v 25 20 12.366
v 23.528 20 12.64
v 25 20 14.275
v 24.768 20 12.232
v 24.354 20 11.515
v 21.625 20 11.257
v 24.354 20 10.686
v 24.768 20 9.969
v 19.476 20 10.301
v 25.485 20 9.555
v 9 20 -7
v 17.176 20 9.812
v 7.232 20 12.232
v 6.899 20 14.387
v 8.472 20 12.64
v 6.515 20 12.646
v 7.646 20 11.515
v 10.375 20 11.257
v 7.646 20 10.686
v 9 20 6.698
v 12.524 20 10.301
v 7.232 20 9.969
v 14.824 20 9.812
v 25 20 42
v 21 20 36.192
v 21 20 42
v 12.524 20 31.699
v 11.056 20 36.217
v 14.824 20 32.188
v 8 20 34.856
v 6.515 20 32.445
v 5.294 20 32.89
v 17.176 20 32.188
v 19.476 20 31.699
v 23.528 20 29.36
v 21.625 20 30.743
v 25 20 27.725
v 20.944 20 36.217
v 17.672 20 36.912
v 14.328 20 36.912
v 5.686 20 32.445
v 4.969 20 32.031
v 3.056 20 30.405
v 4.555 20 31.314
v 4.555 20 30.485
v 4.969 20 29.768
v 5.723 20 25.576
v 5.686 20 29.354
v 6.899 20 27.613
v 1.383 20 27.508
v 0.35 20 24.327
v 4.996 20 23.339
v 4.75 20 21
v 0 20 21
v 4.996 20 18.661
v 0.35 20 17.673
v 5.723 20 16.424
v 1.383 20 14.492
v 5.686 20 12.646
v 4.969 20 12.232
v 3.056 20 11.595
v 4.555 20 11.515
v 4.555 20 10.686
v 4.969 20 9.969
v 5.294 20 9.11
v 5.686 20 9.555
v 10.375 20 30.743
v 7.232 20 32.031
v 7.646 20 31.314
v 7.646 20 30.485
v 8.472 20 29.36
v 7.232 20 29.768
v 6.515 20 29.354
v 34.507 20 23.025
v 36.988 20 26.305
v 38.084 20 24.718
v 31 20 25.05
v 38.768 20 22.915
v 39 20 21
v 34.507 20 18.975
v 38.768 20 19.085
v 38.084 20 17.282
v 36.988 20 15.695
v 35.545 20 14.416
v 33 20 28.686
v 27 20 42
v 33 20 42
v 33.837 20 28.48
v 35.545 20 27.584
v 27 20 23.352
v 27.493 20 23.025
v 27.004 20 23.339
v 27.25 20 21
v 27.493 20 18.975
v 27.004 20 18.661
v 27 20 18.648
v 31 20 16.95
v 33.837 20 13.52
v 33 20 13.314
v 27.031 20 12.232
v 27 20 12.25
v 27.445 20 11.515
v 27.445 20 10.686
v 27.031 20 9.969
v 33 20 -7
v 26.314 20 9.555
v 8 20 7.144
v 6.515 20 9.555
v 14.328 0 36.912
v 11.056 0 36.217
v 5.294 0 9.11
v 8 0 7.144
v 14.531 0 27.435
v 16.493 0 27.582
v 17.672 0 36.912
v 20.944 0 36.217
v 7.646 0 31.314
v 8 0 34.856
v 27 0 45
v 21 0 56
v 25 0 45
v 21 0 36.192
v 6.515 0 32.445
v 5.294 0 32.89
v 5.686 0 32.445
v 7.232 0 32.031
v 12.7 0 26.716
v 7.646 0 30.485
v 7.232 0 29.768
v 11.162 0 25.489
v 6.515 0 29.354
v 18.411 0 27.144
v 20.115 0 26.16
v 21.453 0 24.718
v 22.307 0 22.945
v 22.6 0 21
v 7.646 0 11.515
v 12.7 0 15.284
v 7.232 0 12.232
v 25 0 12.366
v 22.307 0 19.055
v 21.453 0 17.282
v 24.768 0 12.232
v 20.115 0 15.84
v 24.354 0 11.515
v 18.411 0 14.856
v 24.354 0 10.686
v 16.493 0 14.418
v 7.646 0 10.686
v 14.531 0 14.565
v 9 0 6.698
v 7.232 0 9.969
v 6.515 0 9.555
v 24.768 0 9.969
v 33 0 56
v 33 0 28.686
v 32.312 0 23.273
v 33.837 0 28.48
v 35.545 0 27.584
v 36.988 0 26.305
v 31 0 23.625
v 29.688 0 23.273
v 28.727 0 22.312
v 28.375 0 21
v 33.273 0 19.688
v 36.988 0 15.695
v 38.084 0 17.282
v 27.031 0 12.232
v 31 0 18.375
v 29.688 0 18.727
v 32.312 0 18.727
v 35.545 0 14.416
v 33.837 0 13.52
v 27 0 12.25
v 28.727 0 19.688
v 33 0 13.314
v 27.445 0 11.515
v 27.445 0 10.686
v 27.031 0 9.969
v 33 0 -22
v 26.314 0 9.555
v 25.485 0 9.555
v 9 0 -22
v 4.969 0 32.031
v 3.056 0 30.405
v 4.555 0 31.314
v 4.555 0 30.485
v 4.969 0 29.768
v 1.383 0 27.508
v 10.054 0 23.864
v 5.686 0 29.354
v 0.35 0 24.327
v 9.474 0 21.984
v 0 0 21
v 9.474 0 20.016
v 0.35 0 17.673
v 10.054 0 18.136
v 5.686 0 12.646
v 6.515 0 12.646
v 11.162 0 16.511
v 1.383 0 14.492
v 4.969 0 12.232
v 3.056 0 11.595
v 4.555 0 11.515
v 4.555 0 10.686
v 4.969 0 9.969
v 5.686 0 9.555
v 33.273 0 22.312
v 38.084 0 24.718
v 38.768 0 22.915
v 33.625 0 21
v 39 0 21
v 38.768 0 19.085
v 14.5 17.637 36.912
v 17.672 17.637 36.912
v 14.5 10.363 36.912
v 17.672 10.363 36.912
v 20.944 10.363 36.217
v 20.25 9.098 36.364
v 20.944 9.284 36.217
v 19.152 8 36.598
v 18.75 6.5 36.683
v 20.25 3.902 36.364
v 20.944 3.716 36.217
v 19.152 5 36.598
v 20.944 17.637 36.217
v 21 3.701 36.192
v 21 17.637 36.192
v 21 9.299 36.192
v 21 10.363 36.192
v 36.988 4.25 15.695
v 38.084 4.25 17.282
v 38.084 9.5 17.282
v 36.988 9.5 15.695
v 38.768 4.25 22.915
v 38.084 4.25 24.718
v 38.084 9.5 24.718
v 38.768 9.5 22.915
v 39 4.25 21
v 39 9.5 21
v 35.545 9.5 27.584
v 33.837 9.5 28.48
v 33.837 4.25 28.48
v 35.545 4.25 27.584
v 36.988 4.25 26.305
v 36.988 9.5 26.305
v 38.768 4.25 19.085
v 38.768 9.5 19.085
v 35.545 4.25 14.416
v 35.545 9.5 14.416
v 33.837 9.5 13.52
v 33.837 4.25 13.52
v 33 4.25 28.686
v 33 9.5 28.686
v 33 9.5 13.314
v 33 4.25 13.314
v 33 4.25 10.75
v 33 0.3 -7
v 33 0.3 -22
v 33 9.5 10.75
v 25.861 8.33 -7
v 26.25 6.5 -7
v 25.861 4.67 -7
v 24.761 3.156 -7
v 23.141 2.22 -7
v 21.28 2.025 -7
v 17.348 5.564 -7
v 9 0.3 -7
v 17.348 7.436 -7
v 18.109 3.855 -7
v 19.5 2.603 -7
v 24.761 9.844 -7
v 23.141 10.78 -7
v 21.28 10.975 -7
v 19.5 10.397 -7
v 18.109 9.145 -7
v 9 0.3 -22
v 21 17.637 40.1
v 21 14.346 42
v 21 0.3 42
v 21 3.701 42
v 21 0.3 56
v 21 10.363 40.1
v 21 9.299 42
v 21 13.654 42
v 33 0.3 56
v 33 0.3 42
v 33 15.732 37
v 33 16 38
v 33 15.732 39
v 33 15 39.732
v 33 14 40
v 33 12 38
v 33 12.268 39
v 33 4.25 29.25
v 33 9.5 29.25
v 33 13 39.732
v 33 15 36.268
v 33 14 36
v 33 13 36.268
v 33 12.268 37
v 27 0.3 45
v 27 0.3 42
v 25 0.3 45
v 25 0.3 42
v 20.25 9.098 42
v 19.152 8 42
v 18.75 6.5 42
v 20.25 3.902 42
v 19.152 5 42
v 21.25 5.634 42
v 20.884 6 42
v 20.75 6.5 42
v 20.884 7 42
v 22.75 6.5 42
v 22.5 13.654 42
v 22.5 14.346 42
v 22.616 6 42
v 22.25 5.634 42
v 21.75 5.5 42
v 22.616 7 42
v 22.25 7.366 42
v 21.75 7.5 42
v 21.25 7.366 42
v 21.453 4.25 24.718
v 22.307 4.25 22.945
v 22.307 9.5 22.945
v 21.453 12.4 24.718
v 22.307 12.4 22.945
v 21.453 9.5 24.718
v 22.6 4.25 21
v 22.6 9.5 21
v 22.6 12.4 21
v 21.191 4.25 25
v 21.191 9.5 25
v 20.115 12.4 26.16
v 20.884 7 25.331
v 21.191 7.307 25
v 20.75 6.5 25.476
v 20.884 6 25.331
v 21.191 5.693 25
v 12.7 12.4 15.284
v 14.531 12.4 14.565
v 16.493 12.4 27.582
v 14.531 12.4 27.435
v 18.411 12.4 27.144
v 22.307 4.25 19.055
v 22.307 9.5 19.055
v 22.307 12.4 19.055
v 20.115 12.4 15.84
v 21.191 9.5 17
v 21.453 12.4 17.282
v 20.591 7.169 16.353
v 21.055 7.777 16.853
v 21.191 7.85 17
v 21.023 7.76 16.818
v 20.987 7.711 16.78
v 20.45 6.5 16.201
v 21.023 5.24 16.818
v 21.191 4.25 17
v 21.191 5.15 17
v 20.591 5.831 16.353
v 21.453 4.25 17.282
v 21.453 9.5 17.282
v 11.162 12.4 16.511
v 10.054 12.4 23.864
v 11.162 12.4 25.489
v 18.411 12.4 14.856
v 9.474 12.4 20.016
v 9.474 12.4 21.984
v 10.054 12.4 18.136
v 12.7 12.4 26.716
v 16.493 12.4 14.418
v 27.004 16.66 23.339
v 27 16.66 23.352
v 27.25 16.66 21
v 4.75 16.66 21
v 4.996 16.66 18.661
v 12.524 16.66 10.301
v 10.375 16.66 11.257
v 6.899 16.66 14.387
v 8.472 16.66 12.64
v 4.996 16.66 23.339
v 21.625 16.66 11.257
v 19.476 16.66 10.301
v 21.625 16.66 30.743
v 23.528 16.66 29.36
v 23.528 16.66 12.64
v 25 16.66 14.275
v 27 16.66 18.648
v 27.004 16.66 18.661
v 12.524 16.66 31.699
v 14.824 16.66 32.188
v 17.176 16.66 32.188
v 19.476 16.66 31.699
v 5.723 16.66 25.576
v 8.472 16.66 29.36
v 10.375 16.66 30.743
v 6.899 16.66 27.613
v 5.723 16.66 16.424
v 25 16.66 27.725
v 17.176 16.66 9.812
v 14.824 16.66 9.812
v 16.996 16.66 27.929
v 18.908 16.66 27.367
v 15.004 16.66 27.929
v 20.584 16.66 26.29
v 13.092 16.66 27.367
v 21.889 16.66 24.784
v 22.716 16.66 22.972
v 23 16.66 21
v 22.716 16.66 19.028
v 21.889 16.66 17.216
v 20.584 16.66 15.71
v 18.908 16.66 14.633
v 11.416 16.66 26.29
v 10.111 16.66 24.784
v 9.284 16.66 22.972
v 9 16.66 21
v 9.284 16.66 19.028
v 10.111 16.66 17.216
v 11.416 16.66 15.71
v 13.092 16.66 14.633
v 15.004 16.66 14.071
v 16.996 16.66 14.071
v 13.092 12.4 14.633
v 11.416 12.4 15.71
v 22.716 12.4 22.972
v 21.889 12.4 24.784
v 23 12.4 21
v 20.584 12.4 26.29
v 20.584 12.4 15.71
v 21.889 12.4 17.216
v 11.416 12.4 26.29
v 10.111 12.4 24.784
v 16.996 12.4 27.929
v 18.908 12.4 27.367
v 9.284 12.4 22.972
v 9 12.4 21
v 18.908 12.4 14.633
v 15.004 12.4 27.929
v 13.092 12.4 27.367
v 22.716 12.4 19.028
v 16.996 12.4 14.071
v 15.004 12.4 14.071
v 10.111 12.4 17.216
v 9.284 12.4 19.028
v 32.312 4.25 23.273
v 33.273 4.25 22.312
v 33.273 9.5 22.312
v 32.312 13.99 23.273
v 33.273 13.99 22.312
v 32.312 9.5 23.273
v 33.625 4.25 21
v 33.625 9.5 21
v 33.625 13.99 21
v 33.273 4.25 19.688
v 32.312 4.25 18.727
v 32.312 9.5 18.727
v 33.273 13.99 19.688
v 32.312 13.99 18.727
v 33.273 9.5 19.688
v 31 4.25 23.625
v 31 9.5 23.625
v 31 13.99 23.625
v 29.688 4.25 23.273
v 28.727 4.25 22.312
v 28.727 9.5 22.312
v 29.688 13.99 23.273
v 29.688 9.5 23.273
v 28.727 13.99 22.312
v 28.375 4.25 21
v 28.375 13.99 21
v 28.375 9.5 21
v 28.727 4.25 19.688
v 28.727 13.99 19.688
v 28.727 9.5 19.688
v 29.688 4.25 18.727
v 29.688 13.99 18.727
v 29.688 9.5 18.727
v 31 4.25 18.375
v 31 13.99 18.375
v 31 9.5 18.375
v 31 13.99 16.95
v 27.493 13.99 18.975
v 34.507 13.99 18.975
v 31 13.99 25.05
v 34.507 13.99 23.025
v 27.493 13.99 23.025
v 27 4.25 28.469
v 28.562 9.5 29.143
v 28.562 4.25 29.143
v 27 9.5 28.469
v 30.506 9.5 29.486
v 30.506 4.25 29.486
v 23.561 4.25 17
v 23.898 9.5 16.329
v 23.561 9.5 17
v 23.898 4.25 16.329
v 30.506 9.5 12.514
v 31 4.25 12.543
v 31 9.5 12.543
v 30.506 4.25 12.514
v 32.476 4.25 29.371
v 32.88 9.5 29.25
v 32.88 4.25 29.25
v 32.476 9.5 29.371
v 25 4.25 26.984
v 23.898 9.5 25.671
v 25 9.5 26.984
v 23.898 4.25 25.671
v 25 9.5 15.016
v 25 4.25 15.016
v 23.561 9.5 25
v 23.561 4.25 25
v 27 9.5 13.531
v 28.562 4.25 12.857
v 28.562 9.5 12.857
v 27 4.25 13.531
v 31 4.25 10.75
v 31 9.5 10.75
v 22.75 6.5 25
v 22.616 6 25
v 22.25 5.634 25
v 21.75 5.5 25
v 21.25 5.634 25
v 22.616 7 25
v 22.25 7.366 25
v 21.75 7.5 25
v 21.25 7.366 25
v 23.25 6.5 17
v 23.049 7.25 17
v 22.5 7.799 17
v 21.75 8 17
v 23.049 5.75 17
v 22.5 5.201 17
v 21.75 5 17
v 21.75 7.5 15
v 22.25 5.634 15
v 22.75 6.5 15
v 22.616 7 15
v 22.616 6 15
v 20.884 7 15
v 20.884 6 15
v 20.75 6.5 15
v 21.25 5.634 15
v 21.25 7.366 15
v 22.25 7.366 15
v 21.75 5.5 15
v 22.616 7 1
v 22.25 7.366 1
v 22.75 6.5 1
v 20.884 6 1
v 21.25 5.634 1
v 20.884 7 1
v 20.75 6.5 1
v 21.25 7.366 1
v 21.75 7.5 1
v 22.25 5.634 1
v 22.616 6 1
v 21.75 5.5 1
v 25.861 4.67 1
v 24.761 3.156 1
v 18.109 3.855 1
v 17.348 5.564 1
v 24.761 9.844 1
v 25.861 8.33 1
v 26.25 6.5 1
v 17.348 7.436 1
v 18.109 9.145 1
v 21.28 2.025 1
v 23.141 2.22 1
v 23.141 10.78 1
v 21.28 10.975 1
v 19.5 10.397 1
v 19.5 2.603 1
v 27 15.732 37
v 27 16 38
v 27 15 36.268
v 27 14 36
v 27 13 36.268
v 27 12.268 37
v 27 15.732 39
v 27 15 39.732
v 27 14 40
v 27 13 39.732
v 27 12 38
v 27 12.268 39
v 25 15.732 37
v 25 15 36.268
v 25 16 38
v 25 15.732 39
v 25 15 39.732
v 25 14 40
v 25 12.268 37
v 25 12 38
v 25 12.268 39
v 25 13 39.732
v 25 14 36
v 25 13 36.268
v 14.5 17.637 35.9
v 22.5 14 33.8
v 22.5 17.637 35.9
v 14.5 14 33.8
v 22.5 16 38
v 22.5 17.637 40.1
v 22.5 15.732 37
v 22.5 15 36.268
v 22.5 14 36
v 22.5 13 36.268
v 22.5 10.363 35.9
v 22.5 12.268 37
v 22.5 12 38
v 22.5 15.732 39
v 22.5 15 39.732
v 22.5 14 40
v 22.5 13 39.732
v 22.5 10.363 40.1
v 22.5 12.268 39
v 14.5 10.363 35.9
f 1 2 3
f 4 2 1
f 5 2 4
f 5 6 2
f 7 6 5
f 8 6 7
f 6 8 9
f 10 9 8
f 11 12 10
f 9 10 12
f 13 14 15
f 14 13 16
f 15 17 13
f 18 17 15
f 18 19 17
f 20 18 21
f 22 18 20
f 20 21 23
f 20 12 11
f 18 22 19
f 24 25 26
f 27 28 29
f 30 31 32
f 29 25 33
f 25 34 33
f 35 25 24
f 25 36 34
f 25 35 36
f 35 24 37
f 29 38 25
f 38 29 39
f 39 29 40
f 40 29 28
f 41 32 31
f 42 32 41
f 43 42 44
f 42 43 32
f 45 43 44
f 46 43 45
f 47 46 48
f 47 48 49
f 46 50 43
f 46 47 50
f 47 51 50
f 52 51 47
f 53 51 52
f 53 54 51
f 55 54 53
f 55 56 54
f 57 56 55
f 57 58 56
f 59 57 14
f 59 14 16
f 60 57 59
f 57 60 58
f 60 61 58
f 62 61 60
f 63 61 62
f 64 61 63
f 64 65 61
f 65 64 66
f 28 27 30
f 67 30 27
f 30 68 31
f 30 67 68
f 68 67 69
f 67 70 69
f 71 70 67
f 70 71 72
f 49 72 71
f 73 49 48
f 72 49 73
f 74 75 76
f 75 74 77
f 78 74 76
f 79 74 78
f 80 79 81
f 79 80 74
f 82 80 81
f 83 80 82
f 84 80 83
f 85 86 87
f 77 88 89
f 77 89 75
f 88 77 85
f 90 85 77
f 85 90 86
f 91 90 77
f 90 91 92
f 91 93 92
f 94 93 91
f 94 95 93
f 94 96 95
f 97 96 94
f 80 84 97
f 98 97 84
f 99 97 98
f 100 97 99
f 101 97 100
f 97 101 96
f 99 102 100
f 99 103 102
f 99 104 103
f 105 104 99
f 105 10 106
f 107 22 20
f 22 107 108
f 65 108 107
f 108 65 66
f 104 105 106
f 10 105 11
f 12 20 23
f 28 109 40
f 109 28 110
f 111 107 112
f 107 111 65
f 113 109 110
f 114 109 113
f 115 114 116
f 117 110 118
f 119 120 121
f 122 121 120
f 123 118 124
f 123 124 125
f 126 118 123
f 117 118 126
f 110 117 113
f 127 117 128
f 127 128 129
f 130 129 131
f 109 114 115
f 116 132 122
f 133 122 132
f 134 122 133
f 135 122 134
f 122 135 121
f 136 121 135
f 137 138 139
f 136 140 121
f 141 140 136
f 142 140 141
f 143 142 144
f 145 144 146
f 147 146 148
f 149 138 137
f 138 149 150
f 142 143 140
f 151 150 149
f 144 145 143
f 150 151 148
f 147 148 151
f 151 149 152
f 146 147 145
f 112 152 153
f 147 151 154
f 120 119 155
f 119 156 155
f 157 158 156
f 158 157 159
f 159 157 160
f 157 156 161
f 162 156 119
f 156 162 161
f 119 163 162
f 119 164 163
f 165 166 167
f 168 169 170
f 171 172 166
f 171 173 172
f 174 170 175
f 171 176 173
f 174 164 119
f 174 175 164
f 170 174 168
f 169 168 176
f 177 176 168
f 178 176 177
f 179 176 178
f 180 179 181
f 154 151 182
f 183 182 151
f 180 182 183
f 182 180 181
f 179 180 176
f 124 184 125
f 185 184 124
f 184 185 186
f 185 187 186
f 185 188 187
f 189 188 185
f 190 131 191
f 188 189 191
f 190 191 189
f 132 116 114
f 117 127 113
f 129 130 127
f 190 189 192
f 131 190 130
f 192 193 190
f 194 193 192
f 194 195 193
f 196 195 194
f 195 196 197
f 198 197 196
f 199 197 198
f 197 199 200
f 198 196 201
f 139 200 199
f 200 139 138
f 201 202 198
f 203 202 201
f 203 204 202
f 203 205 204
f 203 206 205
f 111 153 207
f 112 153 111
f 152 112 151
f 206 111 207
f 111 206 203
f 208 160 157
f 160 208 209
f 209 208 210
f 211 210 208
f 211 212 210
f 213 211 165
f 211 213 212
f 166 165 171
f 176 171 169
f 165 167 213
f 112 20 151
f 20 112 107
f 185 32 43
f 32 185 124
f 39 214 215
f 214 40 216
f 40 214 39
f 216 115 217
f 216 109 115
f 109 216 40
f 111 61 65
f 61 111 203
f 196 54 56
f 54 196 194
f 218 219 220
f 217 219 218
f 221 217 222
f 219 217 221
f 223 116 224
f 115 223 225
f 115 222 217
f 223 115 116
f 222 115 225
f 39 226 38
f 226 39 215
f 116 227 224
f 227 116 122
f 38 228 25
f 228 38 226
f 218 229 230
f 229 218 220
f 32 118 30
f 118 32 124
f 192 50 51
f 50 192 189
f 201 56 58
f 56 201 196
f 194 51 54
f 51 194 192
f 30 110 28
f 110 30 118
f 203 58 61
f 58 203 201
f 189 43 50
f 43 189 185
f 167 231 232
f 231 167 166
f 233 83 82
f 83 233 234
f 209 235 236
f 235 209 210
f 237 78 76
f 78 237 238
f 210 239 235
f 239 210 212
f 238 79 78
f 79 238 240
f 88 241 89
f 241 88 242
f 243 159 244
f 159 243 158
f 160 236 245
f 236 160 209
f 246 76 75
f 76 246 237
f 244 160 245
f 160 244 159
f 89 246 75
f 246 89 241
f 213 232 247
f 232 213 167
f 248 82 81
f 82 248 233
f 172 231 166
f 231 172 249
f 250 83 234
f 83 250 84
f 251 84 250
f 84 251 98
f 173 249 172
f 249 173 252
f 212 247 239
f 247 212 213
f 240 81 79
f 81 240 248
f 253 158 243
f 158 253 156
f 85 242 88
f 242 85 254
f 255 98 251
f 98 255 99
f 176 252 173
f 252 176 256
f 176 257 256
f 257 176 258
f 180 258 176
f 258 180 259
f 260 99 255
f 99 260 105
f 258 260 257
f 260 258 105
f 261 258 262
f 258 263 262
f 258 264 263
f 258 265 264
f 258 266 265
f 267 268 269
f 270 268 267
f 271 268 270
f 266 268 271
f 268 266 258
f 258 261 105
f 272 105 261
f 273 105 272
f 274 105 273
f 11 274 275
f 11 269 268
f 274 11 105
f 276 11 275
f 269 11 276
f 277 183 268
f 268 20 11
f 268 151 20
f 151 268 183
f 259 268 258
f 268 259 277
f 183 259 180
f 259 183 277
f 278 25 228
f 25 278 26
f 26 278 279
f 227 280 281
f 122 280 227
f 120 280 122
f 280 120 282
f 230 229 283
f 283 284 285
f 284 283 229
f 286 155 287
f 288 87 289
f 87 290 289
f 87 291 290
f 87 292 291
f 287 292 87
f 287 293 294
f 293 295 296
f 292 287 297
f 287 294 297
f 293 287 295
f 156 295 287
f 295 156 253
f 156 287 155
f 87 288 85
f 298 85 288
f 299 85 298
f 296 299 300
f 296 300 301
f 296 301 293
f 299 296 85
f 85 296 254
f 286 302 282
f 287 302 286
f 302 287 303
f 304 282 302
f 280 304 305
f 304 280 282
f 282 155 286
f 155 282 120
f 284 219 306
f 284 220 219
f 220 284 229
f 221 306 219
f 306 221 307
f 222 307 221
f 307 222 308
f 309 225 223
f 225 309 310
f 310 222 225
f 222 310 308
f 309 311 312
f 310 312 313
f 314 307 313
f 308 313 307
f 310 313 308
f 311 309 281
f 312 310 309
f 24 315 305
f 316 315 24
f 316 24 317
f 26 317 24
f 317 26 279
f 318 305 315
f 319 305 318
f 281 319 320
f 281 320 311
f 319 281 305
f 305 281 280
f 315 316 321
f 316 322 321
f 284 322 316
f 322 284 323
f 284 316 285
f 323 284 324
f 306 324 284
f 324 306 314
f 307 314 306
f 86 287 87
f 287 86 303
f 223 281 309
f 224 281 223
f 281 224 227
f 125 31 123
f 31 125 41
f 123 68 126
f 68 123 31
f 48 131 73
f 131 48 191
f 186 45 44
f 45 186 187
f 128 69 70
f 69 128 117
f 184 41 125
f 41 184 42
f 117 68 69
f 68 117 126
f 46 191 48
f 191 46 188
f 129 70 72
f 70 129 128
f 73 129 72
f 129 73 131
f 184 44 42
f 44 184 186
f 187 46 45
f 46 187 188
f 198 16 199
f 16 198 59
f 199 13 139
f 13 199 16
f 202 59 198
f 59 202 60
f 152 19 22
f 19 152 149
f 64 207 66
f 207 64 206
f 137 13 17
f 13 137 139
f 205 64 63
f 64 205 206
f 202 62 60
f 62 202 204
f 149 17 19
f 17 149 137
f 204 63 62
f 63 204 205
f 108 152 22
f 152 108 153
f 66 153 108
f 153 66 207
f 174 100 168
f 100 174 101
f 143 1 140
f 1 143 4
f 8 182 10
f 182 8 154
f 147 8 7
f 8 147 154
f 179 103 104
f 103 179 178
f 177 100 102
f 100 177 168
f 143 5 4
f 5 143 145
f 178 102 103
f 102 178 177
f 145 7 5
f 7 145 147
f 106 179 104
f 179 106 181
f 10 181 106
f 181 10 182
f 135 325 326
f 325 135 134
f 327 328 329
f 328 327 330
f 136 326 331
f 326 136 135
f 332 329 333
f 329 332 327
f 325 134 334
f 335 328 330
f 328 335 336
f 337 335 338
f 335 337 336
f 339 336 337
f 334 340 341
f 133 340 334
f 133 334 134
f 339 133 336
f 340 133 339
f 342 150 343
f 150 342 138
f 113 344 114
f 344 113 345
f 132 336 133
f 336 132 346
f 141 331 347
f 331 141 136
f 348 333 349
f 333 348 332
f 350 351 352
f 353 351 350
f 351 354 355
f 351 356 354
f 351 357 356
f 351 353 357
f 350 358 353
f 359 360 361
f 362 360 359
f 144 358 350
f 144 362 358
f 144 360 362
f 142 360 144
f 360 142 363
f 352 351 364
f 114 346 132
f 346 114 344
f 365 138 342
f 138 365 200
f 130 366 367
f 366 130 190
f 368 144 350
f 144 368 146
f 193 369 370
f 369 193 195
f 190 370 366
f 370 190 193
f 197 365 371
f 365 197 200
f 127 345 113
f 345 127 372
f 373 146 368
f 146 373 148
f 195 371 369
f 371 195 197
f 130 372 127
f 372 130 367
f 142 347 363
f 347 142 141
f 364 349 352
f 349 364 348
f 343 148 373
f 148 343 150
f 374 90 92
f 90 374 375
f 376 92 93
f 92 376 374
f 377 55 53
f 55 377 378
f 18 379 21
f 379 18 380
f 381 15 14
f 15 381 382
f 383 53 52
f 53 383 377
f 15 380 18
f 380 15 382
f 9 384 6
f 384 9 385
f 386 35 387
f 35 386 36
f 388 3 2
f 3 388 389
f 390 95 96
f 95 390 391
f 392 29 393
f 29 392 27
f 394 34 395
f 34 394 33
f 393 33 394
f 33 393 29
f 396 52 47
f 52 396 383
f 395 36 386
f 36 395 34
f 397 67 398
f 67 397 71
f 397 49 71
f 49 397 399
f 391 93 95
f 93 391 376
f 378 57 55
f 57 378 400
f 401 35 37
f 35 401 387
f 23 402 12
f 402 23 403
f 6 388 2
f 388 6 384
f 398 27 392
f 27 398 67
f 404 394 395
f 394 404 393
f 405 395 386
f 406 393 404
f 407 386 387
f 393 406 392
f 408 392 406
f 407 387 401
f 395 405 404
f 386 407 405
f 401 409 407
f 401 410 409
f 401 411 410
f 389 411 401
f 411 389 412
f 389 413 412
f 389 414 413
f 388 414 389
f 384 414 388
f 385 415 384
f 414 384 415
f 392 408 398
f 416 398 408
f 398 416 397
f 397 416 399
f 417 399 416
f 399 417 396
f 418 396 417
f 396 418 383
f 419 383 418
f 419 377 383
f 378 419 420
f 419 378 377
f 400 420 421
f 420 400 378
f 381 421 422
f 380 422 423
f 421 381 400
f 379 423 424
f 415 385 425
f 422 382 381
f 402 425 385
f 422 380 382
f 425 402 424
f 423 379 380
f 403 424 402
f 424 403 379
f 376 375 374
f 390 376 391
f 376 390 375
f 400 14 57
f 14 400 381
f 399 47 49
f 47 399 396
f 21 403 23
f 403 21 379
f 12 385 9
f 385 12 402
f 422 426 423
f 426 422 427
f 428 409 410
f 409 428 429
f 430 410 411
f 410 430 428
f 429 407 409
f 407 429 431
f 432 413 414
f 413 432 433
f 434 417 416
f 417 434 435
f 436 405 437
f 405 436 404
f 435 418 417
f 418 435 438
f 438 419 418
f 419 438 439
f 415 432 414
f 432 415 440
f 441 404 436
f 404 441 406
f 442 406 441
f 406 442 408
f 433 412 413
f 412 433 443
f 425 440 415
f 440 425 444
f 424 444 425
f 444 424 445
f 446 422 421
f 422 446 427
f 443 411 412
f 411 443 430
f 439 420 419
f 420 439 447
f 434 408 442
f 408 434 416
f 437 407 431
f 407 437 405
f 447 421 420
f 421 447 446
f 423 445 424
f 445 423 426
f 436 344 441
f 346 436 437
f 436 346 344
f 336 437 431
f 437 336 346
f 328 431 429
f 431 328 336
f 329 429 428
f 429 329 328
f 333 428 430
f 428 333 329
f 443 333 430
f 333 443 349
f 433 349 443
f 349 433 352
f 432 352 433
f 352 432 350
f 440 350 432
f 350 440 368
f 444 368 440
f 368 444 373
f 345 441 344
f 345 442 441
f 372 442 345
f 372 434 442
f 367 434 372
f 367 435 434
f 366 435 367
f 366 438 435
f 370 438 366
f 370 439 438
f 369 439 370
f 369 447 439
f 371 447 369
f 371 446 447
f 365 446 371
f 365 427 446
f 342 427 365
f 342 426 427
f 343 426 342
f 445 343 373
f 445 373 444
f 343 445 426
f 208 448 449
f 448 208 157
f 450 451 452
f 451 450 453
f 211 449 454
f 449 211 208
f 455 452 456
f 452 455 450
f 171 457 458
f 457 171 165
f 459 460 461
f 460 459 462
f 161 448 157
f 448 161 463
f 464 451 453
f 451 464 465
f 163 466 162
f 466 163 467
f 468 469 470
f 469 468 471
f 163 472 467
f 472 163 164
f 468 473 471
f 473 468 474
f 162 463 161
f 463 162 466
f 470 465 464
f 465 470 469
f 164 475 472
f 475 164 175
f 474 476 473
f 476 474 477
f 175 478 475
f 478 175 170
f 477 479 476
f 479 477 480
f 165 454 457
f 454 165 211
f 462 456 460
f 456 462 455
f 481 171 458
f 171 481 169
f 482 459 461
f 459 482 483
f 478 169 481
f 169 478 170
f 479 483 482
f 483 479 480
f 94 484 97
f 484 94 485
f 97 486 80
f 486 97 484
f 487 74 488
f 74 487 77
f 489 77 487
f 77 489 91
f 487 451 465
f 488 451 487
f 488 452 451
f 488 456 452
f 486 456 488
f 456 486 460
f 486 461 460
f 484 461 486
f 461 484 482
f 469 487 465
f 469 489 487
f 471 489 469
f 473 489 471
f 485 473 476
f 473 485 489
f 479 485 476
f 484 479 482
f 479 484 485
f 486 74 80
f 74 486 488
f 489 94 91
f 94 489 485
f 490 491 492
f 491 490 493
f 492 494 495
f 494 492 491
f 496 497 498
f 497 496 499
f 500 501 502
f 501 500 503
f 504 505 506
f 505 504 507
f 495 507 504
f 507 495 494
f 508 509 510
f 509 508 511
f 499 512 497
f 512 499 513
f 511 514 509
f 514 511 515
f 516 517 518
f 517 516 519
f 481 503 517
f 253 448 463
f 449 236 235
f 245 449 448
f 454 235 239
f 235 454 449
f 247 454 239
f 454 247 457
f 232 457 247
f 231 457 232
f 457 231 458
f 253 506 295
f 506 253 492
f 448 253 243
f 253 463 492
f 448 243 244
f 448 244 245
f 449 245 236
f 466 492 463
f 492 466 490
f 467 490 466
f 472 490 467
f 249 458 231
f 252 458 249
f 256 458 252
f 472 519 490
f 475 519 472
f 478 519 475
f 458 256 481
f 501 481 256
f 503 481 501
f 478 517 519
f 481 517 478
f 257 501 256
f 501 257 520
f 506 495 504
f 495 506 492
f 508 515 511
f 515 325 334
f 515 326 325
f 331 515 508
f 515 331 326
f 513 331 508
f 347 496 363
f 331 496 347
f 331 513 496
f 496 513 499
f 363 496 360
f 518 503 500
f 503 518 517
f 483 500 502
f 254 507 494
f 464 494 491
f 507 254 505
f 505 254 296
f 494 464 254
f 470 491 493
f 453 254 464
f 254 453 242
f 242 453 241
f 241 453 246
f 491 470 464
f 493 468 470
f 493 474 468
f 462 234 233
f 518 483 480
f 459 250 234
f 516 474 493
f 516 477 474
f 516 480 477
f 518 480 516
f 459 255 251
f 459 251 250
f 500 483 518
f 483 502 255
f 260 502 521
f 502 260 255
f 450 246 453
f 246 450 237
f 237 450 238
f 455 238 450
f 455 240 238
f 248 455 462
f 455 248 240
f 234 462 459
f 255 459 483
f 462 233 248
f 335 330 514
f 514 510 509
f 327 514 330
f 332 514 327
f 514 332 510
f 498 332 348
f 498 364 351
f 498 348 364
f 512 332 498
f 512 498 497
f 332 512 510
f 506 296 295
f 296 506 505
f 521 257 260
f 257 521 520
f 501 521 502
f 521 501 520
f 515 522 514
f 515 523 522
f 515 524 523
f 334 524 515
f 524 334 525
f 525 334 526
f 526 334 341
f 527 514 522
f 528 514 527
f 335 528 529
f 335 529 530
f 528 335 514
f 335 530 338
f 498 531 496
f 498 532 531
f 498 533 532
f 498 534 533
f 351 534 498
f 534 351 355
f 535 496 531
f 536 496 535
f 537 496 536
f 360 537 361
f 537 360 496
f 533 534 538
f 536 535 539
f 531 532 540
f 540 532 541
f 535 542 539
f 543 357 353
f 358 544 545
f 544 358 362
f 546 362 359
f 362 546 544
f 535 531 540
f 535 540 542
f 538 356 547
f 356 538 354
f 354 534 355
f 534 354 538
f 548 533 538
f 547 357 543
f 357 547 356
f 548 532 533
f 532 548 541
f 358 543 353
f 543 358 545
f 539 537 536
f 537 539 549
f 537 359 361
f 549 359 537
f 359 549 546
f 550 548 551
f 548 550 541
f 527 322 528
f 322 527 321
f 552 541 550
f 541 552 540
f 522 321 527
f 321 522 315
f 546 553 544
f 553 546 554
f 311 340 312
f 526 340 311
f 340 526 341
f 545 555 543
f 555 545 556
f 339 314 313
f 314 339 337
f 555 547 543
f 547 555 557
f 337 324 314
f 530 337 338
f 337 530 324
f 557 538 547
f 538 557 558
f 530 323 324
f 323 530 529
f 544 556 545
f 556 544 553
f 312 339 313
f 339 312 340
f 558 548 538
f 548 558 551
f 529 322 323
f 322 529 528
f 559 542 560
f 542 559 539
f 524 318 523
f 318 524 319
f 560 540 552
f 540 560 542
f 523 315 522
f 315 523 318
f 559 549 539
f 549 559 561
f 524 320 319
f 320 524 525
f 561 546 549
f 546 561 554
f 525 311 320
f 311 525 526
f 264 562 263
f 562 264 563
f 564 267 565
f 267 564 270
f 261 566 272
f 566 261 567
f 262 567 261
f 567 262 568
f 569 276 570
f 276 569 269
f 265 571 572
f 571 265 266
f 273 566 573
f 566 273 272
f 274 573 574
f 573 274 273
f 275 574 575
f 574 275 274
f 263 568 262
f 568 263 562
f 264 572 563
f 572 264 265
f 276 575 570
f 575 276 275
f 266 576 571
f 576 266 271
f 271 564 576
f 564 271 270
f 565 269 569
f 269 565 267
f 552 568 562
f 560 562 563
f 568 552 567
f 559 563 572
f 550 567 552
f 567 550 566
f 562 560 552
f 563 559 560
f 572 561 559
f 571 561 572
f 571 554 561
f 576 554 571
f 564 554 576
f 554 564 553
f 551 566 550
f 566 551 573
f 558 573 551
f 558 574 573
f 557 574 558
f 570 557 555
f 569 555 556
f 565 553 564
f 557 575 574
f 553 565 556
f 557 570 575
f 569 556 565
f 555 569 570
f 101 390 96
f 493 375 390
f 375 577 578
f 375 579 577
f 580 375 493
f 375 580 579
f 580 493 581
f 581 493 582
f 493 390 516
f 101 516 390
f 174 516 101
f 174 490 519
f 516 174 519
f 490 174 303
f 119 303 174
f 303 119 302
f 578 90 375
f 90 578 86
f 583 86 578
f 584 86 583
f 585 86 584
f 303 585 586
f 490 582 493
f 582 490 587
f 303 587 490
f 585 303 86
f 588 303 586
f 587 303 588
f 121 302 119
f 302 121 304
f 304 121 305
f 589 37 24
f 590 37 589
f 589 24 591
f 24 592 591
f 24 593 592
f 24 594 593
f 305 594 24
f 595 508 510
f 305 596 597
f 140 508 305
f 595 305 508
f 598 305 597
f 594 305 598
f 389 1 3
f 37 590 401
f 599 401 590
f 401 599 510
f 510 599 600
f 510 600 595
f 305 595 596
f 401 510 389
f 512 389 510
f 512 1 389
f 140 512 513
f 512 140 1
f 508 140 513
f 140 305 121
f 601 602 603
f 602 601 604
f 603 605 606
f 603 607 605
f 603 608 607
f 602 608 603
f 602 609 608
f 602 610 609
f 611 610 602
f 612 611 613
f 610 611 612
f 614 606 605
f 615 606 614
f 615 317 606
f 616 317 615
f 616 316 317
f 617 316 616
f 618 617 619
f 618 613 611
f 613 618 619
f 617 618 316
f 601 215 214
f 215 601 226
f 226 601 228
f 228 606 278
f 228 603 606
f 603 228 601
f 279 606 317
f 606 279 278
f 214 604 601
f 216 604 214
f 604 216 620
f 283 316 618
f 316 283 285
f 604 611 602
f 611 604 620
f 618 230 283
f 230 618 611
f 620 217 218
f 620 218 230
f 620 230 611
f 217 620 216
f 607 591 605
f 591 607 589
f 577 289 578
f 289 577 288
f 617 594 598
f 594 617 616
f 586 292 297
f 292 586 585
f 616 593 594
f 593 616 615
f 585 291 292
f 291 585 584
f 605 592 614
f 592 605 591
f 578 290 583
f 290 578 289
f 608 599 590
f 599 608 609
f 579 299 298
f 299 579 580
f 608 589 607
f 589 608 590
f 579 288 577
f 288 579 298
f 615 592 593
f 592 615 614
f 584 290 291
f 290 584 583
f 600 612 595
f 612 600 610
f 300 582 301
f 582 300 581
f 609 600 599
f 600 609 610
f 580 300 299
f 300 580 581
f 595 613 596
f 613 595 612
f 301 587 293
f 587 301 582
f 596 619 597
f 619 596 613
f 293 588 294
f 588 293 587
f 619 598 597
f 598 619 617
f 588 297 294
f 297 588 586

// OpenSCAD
first_layer = 0.3;

difference() {
	
	union() {
		//main cylinder
		translate([16,20,21]) rotate([90,0,0]) cylinder(h=20, r=16);//cube([44, 20, 42]);
		
		//bearing mount
		translate([31,20,21]) rotate([90,0,0]) cylinder (h=20, r=8);
		
		//V3 Mount
		translate([9,0,-7]) cube([24, 20, 22]);
		translate([21,first_layer/2,-11]) rotate([90,0,0]) cube([24, 22, first_layer], center=true);
		translate([27,first_layer/2,45]) rotate([90,0,0]) cube([12, 22, first_layer], center=true);
		
		//filament support
		translate([21.75,6.5,34]) rotate([0,0,0]) cylinder (h=8, r=3, $fn=12);
		
		//groovemount supports
//		translate([33,6.5,-7]) rotate([0,0,0]) cylinder (h=16, r=5, $fn=12);
//		translate([9,6.5,-7]) rotate([0,0,0]) cylinder (h=16, r=5, $fn=12);
		
		//clamp
		translate([21,0,28]) cube([12, 20, 14]);
	}
	
	//pulley opening
	translate([16,21,21]) rotate([90,0,0]){
		cylinder (h=22, r=6.6);
		
		rotate([0,0,45]) {
		//translate([14,0,0]) cylinder(h=22, r=1.6, $fn=12);
		translate([0,14,0]) cylinder(h=22, r=1.6, $fn=12);
		translate([-14,0,0]) cylinder(h=22, r=1.6, $fn=12);
		translate([0,-14,0]) cylinder(h=22, r=1.6, $fn=12);
		}
	}
	
	//gearhead indentation
	translate([16,20.01,21]) rotate([90,0,0]) cylinder (h=3.35, r=11.25);

	//pulley hub indentation
	translate([16,20-2,21]) rotate([90,0,0]) cylinder (h=5.6, r=7);
	
	//bearing screws
	translate([31,21,21]) rotate([90,0,0]) cylinder (h=22, r=2.625, $fn=12); //precision m5
	//translate([31,21,21]) rotate([90,0,0]) cylinder (h=22, r=2.6, $fn=12); //regular M5 screw
	translate([31,22,21]) rotate([90,30,0]) cylinder (h=8.01, r=8.1/2, $fn=6); //M4
	//#translate([31,22,21]) rotate([90,30,0]) cylinder (h=8.01, r=4.7, $fn=6); //M5
	
	//bearing
	translate([31,9.5,21]) rotate([90,0,0]) cylinder (h=5.25, r=8.5);
	translate([31,9.5-5.25,21-8.25-2]) cube([20, 5.25, 18.5]);
	//opening between bearing and pulley
	translate([20,9.5-5.25,21-8.25+3.25+1]) cube([10, 5.25, 8]);

	//filament path chamfer
	translate([21.75,6.5,15]) rotate([0,0,0]) cylinder (h=2, r1=1, r2=1.5, $fn=12);		
	
	//filament path
	#translate([21.75,6.5,-10]) rotate([0,0,0]) cylinder (h=60, r=1, $fn=12); 
	
	//V3 Mount
//	translate([21.75,6.5,-2]) rotate([0,0,0]) cylinder (h=5, r=8.25);
	translate([21.75,6.5,-7]) rotate([0,0,0]) cylinder (h=8, r=4.5);
//	translate([21.75-8,6.5-8,-2]) cube([16, 8, 5]);
//	translate([21.75-6,6.5-7,-7]) cube([12, 7, 5]);
//	translate([21.75,6.5,3.5]) rotate([90,0,0]) cylinder (h=10, r=1,  $fn=12);
	
	//groovemount supports
//	translate([33,6.5,-8]) rotate([0,0,0]) cylinder (h=20, r=1.6, $fn=12);
//	translate([33,6.5,7]) rotate([0,0,0]) cylinder (h=3, r=3.5, $fn=6);

//	translate([9,6.5,-8]) rotate([0,0,0]) cylinder (h=20, r=1.6, $fn=12);
//	translate([9,6.5,7]) rotate([0,0,0]) cylinder (h=3, r=3.5, $fn=6);
//	translate([3,3,7]) cube([8, 7, 3]);
	
	//clamp slit
	translate([25,-1,10]) cube([2, 22, 35]);
	//clamp nut
	translate([14.5,14,38]) rotate([0,90,0]) cylinder (h=8, r=4.2, $fn=6);
	//clamp screw hole
	translate([15,14,38]) rotate([0,90,0]) cylinder (h=20, r=2, $fn=12);
	
	
}
